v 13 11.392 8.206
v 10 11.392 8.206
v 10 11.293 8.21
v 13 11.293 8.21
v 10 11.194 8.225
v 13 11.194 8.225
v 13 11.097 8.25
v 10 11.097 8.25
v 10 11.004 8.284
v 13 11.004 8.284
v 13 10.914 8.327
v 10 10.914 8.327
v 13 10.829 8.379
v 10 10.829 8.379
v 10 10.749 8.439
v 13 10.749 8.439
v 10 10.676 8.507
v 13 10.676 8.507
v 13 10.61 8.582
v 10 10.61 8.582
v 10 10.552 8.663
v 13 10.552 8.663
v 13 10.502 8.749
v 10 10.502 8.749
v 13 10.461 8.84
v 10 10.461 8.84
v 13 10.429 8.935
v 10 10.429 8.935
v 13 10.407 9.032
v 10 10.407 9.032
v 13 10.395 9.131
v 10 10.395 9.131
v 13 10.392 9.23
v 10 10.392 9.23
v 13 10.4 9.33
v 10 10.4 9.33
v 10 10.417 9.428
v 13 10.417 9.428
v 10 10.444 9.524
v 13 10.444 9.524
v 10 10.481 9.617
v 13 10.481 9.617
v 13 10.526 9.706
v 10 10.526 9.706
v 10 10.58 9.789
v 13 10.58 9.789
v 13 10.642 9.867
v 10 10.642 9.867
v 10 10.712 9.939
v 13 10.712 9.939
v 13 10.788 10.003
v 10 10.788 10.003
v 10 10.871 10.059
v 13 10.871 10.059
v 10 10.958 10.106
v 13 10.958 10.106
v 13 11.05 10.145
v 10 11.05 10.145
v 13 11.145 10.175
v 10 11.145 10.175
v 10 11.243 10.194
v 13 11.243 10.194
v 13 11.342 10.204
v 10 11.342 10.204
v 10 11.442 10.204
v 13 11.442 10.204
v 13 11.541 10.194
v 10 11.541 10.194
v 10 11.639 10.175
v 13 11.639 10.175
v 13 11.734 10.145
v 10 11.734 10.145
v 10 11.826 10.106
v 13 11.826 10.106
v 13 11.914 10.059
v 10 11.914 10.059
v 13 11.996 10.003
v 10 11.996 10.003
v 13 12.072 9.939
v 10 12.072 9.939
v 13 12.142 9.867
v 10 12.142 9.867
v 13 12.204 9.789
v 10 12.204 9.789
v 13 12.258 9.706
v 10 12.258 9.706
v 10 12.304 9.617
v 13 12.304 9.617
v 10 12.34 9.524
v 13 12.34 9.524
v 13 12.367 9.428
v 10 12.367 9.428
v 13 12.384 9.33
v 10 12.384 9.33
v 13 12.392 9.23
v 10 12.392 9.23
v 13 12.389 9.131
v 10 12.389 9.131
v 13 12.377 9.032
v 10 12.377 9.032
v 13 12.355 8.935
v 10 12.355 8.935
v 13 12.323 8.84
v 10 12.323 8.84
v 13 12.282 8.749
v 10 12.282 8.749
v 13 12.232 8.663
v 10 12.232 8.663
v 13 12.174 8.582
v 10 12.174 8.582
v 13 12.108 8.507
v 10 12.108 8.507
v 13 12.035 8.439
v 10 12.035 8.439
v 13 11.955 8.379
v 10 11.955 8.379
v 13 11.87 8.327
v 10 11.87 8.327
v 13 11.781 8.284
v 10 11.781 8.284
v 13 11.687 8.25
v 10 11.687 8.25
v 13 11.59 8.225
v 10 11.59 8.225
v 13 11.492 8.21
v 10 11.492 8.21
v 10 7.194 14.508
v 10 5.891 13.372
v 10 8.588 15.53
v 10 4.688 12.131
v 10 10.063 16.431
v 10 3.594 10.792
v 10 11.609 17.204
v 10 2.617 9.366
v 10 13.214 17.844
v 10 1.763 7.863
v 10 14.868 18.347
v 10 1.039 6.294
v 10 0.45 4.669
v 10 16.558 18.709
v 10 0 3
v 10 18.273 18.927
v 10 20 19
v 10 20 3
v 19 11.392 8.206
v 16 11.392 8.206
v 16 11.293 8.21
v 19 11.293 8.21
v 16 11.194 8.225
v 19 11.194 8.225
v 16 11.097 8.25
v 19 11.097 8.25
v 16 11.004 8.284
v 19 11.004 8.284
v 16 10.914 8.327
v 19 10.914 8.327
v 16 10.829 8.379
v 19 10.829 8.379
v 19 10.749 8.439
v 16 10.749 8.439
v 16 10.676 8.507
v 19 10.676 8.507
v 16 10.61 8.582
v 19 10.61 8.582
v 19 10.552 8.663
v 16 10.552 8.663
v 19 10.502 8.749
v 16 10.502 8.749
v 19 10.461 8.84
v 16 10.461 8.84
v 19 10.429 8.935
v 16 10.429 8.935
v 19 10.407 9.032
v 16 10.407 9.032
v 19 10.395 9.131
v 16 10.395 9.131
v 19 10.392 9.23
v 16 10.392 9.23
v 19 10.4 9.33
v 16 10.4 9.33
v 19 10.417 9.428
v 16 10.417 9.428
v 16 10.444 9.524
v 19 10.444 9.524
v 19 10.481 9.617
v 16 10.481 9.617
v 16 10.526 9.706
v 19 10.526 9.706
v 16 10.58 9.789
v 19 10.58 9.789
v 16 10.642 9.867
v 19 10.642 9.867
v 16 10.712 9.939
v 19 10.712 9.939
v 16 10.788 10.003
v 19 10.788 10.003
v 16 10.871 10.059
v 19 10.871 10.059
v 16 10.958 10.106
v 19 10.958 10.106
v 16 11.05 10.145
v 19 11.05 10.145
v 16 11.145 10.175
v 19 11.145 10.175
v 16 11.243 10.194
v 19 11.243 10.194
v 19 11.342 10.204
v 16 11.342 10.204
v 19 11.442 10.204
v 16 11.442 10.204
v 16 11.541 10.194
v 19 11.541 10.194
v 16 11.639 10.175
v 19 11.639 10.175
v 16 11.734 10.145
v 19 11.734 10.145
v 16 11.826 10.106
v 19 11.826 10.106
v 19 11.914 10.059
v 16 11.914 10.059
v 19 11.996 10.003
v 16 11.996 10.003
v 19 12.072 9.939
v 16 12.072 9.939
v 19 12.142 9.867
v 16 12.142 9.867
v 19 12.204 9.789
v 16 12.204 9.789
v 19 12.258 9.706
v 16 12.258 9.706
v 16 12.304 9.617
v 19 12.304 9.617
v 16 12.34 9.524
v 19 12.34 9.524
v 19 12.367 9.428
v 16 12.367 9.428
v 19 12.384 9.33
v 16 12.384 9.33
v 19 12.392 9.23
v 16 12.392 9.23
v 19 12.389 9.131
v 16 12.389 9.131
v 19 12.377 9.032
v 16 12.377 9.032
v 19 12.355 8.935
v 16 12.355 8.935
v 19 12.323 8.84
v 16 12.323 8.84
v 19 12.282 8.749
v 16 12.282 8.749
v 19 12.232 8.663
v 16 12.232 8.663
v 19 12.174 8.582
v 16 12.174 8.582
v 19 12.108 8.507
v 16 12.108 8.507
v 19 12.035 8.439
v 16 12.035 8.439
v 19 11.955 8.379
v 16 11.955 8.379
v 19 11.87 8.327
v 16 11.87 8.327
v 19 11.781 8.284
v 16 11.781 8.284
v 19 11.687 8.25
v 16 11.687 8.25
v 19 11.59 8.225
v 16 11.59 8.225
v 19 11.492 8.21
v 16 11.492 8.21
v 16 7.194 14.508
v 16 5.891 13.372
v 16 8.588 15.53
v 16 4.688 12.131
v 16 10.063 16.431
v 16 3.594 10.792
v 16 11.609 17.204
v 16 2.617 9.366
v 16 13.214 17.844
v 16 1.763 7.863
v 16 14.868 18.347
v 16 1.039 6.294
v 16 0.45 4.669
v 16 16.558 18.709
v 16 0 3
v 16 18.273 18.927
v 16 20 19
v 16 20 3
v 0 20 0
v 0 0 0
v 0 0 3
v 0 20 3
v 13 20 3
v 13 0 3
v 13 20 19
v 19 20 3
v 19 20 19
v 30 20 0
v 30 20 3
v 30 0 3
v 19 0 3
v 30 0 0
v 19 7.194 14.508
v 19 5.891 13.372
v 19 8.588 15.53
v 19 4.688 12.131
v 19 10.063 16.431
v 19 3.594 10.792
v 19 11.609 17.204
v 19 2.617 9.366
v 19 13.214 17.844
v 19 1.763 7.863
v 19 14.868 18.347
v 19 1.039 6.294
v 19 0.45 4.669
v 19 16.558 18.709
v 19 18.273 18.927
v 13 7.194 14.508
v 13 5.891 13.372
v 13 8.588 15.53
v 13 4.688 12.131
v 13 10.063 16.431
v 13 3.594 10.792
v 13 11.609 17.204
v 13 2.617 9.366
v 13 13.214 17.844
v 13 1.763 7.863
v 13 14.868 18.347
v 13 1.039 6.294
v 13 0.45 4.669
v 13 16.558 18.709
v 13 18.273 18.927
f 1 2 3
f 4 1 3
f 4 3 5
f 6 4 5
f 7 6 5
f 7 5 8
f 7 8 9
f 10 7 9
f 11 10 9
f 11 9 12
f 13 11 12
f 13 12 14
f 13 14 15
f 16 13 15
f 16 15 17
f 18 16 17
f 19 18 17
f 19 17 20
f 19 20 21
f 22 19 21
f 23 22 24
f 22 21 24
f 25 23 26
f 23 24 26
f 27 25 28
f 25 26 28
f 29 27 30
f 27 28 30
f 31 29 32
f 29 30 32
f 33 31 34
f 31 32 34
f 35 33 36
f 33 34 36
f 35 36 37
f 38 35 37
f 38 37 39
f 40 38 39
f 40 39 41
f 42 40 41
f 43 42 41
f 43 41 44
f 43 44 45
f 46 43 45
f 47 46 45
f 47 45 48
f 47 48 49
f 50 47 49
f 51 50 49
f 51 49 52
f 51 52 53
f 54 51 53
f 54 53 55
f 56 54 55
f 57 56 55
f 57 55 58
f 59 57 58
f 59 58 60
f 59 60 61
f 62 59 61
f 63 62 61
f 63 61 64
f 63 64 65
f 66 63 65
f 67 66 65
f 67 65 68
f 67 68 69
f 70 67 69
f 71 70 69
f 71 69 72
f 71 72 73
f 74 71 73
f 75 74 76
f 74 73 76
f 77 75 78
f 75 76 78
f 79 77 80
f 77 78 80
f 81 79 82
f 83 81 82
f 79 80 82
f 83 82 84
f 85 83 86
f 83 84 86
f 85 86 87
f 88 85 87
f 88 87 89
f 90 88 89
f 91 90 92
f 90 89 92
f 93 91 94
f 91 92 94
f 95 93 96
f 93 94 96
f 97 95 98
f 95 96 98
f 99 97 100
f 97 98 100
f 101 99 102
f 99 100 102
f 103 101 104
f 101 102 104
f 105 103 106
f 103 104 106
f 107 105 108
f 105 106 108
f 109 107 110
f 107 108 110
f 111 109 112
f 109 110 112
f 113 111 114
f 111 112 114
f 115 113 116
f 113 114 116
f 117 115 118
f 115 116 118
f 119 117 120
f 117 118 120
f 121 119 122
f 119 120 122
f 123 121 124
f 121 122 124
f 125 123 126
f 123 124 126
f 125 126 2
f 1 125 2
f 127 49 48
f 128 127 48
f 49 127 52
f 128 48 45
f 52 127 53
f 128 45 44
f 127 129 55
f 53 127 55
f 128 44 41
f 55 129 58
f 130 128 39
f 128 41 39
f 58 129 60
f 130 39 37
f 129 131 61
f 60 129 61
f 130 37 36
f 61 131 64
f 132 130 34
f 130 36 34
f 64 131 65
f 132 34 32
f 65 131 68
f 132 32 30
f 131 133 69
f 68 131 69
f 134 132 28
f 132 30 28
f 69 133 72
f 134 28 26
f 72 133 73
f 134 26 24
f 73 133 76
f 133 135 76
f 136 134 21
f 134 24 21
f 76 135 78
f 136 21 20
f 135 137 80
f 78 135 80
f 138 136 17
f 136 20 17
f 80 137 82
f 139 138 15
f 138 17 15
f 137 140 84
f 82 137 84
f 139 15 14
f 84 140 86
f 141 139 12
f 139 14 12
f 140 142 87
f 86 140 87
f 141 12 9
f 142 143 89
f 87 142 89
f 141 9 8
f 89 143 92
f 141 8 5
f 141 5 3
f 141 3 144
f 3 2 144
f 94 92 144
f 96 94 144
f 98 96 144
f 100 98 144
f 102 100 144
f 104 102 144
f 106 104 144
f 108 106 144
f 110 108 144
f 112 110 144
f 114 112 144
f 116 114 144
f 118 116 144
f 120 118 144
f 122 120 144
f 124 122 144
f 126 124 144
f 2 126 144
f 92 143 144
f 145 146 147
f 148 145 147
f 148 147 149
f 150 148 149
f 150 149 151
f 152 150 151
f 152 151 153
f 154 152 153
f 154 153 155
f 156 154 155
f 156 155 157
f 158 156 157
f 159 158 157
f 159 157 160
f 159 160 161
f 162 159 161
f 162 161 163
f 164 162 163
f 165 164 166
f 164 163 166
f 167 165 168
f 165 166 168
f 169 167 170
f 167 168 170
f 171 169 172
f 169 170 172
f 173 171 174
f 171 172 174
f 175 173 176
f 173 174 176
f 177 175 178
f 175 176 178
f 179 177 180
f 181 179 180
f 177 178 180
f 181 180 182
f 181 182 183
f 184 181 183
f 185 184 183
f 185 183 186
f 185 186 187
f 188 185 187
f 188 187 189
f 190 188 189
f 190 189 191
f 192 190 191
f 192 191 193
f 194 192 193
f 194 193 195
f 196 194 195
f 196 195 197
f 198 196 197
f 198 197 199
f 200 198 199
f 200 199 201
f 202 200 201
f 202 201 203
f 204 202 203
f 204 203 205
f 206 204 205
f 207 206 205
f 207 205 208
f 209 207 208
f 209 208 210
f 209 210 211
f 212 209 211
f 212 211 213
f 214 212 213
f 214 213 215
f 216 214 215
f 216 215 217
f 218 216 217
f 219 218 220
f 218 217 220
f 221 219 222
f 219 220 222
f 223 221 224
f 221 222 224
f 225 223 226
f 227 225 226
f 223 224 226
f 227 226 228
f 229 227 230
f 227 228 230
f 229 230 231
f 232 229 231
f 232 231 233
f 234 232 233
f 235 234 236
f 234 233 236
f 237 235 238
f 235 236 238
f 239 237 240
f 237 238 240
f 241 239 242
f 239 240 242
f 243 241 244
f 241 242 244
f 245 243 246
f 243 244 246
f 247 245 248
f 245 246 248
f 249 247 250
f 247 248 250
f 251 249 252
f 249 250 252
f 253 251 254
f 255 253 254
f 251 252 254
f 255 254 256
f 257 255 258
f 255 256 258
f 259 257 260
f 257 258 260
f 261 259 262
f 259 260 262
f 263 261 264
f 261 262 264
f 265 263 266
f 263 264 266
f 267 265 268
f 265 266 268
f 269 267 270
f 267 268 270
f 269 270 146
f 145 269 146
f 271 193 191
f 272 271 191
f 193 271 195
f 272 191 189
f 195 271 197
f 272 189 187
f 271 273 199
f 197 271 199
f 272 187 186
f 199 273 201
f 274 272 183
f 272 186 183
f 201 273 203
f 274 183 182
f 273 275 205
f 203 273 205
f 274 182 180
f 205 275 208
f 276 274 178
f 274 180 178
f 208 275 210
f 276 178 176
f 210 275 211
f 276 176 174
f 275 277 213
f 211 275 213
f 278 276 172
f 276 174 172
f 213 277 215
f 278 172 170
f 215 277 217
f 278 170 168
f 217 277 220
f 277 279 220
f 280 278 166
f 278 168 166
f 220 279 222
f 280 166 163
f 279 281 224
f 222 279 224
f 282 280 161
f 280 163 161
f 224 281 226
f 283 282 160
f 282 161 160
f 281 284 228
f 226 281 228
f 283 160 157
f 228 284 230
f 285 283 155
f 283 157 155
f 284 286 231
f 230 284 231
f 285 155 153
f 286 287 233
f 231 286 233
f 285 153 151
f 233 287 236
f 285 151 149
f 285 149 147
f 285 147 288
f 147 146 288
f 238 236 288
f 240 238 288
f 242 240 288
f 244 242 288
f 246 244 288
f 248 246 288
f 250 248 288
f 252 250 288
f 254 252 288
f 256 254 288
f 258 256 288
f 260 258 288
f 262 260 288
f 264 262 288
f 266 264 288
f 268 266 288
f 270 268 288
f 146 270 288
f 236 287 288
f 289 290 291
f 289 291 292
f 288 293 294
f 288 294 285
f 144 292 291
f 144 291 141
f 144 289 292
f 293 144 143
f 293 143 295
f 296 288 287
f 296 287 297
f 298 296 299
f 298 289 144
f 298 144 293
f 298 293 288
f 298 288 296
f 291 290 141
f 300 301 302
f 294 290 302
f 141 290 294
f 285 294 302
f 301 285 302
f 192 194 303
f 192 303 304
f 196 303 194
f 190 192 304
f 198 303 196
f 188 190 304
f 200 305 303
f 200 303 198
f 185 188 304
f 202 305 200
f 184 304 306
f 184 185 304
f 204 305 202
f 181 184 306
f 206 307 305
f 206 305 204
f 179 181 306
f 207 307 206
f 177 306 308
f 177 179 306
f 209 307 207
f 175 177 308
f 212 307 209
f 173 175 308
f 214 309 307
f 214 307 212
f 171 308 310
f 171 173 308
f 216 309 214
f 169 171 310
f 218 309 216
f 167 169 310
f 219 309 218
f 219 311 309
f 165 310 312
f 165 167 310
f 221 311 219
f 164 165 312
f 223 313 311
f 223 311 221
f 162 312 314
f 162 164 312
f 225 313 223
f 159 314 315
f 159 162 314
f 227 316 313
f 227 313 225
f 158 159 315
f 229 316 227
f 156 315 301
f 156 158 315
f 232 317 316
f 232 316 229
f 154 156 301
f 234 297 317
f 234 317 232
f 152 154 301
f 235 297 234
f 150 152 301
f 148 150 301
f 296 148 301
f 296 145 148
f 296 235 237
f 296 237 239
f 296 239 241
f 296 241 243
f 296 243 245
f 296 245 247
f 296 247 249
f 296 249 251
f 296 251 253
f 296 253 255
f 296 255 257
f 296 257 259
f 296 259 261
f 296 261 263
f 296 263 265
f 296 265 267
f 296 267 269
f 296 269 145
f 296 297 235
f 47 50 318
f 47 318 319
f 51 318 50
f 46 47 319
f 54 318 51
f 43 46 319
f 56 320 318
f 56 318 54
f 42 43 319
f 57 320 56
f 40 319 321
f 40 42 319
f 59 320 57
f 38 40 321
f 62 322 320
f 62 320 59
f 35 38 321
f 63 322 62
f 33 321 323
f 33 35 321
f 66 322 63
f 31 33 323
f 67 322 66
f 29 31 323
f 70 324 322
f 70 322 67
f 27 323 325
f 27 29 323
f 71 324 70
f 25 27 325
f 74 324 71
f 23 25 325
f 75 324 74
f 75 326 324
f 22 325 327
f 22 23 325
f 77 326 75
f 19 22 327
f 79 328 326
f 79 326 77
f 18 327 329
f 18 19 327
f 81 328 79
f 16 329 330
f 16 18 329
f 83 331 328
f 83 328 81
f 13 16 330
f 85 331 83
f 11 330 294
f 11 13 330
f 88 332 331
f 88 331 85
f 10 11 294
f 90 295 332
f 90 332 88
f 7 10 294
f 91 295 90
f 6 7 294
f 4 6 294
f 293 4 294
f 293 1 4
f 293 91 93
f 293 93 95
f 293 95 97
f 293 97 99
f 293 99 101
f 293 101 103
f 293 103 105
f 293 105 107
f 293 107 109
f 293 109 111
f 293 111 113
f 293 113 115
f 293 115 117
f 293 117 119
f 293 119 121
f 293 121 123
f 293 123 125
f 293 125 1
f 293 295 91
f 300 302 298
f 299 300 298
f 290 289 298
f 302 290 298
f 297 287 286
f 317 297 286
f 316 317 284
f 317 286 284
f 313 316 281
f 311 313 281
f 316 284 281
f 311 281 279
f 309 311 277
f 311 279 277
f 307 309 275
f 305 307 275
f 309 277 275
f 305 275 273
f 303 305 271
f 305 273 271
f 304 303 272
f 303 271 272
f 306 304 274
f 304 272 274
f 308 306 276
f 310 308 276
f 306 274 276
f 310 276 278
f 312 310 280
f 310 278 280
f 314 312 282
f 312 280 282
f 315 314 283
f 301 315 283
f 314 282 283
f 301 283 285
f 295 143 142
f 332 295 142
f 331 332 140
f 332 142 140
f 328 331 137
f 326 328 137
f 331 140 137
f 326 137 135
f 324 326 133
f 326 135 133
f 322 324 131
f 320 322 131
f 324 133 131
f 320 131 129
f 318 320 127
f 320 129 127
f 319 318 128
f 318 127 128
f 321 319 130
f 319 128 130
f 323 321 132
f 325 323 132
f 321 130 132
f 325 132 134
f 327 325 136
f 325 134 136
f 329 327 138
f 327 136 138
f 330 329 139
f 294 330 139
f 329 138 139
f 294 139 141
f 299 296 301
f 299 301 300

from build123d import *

# Parameters (mm, degrees)
IZIM1_W                     = 30
IZIM1_H                     = 20
Y_KSEKLIK_EKSTR_ZYON1_DEPTH = 3
Y_KSEKLIK_EKSTR_ZYON2_START = -10
Y_KSEKLIK_EKSTR_ZYON2_DEPTH = 3
Y_KSEKLIK_EKSTR_ZYON3_START = -16
Y_KSEKLIK_EKSTR_ZYON3_DEPTH = 3
IZIM3_R                     = 1
KES_EKSTR_ZYON1_DEPTH       = 25


with BuildPart() as part:
    # Çizim1 → Yükseklik-Ekstrüzyon1 (new body)
    with BuildSketch(Plane.XY):
        with Locations((15, 10)):
            Rectangle(IZIM1_W, IZIM1_H)
    extrude(amount=Y_KSEKLIK_EKSTR_ZYON1_DEPTH)

    # Çizim2 → Yükseklik-Ekstrüzyon2 (add)
    with BuildSketch(Plane.ZY.offset(Y_KSEKLIK_EKSTR_ZYON2_START)):
        with BuildLine():
            Line((3, 0), (3, 20))
            Line((3, 20), (19, 20))
            ThreePointArc((19, 20), (14.507810594, 7.193751525), (3, 0))
        make_face()
    extrude(amount=-Y_KSEKLIK_EKSTR_ZYON2_DEPTH)

    # Çizim2<2> → Yükseklik-Ekstrüzyon3 (add)
    with BuildSketch(Plane.ZY.offset(Y_KSEKLIK_EKSTR_ZYON3_START)):
        with BuildLine():
            Line((3, 0), (3, 20))
            Line((3, 20), (19, 20))
            ThreePointArc((19, 20), (14.507810594, 7.193751525), (3, 0))
        make_face()
    extrude(amount=-Y_KSEKLIK_EKSTR_ZYON3_DEPTH)

    # Çizim3 → Kes-Ekstrüzyon1 (cut)
    with BuildSketch(Plane.ZY.offset(-10)):
        with Locations((9.205520774, 11.392083612)):
            Circle(IZIM3_R)
    extrude(amount=-KES_EKSTR_ZYON1_DEPTH, mode=Mode.SUBTRACT)


solid = part.part
